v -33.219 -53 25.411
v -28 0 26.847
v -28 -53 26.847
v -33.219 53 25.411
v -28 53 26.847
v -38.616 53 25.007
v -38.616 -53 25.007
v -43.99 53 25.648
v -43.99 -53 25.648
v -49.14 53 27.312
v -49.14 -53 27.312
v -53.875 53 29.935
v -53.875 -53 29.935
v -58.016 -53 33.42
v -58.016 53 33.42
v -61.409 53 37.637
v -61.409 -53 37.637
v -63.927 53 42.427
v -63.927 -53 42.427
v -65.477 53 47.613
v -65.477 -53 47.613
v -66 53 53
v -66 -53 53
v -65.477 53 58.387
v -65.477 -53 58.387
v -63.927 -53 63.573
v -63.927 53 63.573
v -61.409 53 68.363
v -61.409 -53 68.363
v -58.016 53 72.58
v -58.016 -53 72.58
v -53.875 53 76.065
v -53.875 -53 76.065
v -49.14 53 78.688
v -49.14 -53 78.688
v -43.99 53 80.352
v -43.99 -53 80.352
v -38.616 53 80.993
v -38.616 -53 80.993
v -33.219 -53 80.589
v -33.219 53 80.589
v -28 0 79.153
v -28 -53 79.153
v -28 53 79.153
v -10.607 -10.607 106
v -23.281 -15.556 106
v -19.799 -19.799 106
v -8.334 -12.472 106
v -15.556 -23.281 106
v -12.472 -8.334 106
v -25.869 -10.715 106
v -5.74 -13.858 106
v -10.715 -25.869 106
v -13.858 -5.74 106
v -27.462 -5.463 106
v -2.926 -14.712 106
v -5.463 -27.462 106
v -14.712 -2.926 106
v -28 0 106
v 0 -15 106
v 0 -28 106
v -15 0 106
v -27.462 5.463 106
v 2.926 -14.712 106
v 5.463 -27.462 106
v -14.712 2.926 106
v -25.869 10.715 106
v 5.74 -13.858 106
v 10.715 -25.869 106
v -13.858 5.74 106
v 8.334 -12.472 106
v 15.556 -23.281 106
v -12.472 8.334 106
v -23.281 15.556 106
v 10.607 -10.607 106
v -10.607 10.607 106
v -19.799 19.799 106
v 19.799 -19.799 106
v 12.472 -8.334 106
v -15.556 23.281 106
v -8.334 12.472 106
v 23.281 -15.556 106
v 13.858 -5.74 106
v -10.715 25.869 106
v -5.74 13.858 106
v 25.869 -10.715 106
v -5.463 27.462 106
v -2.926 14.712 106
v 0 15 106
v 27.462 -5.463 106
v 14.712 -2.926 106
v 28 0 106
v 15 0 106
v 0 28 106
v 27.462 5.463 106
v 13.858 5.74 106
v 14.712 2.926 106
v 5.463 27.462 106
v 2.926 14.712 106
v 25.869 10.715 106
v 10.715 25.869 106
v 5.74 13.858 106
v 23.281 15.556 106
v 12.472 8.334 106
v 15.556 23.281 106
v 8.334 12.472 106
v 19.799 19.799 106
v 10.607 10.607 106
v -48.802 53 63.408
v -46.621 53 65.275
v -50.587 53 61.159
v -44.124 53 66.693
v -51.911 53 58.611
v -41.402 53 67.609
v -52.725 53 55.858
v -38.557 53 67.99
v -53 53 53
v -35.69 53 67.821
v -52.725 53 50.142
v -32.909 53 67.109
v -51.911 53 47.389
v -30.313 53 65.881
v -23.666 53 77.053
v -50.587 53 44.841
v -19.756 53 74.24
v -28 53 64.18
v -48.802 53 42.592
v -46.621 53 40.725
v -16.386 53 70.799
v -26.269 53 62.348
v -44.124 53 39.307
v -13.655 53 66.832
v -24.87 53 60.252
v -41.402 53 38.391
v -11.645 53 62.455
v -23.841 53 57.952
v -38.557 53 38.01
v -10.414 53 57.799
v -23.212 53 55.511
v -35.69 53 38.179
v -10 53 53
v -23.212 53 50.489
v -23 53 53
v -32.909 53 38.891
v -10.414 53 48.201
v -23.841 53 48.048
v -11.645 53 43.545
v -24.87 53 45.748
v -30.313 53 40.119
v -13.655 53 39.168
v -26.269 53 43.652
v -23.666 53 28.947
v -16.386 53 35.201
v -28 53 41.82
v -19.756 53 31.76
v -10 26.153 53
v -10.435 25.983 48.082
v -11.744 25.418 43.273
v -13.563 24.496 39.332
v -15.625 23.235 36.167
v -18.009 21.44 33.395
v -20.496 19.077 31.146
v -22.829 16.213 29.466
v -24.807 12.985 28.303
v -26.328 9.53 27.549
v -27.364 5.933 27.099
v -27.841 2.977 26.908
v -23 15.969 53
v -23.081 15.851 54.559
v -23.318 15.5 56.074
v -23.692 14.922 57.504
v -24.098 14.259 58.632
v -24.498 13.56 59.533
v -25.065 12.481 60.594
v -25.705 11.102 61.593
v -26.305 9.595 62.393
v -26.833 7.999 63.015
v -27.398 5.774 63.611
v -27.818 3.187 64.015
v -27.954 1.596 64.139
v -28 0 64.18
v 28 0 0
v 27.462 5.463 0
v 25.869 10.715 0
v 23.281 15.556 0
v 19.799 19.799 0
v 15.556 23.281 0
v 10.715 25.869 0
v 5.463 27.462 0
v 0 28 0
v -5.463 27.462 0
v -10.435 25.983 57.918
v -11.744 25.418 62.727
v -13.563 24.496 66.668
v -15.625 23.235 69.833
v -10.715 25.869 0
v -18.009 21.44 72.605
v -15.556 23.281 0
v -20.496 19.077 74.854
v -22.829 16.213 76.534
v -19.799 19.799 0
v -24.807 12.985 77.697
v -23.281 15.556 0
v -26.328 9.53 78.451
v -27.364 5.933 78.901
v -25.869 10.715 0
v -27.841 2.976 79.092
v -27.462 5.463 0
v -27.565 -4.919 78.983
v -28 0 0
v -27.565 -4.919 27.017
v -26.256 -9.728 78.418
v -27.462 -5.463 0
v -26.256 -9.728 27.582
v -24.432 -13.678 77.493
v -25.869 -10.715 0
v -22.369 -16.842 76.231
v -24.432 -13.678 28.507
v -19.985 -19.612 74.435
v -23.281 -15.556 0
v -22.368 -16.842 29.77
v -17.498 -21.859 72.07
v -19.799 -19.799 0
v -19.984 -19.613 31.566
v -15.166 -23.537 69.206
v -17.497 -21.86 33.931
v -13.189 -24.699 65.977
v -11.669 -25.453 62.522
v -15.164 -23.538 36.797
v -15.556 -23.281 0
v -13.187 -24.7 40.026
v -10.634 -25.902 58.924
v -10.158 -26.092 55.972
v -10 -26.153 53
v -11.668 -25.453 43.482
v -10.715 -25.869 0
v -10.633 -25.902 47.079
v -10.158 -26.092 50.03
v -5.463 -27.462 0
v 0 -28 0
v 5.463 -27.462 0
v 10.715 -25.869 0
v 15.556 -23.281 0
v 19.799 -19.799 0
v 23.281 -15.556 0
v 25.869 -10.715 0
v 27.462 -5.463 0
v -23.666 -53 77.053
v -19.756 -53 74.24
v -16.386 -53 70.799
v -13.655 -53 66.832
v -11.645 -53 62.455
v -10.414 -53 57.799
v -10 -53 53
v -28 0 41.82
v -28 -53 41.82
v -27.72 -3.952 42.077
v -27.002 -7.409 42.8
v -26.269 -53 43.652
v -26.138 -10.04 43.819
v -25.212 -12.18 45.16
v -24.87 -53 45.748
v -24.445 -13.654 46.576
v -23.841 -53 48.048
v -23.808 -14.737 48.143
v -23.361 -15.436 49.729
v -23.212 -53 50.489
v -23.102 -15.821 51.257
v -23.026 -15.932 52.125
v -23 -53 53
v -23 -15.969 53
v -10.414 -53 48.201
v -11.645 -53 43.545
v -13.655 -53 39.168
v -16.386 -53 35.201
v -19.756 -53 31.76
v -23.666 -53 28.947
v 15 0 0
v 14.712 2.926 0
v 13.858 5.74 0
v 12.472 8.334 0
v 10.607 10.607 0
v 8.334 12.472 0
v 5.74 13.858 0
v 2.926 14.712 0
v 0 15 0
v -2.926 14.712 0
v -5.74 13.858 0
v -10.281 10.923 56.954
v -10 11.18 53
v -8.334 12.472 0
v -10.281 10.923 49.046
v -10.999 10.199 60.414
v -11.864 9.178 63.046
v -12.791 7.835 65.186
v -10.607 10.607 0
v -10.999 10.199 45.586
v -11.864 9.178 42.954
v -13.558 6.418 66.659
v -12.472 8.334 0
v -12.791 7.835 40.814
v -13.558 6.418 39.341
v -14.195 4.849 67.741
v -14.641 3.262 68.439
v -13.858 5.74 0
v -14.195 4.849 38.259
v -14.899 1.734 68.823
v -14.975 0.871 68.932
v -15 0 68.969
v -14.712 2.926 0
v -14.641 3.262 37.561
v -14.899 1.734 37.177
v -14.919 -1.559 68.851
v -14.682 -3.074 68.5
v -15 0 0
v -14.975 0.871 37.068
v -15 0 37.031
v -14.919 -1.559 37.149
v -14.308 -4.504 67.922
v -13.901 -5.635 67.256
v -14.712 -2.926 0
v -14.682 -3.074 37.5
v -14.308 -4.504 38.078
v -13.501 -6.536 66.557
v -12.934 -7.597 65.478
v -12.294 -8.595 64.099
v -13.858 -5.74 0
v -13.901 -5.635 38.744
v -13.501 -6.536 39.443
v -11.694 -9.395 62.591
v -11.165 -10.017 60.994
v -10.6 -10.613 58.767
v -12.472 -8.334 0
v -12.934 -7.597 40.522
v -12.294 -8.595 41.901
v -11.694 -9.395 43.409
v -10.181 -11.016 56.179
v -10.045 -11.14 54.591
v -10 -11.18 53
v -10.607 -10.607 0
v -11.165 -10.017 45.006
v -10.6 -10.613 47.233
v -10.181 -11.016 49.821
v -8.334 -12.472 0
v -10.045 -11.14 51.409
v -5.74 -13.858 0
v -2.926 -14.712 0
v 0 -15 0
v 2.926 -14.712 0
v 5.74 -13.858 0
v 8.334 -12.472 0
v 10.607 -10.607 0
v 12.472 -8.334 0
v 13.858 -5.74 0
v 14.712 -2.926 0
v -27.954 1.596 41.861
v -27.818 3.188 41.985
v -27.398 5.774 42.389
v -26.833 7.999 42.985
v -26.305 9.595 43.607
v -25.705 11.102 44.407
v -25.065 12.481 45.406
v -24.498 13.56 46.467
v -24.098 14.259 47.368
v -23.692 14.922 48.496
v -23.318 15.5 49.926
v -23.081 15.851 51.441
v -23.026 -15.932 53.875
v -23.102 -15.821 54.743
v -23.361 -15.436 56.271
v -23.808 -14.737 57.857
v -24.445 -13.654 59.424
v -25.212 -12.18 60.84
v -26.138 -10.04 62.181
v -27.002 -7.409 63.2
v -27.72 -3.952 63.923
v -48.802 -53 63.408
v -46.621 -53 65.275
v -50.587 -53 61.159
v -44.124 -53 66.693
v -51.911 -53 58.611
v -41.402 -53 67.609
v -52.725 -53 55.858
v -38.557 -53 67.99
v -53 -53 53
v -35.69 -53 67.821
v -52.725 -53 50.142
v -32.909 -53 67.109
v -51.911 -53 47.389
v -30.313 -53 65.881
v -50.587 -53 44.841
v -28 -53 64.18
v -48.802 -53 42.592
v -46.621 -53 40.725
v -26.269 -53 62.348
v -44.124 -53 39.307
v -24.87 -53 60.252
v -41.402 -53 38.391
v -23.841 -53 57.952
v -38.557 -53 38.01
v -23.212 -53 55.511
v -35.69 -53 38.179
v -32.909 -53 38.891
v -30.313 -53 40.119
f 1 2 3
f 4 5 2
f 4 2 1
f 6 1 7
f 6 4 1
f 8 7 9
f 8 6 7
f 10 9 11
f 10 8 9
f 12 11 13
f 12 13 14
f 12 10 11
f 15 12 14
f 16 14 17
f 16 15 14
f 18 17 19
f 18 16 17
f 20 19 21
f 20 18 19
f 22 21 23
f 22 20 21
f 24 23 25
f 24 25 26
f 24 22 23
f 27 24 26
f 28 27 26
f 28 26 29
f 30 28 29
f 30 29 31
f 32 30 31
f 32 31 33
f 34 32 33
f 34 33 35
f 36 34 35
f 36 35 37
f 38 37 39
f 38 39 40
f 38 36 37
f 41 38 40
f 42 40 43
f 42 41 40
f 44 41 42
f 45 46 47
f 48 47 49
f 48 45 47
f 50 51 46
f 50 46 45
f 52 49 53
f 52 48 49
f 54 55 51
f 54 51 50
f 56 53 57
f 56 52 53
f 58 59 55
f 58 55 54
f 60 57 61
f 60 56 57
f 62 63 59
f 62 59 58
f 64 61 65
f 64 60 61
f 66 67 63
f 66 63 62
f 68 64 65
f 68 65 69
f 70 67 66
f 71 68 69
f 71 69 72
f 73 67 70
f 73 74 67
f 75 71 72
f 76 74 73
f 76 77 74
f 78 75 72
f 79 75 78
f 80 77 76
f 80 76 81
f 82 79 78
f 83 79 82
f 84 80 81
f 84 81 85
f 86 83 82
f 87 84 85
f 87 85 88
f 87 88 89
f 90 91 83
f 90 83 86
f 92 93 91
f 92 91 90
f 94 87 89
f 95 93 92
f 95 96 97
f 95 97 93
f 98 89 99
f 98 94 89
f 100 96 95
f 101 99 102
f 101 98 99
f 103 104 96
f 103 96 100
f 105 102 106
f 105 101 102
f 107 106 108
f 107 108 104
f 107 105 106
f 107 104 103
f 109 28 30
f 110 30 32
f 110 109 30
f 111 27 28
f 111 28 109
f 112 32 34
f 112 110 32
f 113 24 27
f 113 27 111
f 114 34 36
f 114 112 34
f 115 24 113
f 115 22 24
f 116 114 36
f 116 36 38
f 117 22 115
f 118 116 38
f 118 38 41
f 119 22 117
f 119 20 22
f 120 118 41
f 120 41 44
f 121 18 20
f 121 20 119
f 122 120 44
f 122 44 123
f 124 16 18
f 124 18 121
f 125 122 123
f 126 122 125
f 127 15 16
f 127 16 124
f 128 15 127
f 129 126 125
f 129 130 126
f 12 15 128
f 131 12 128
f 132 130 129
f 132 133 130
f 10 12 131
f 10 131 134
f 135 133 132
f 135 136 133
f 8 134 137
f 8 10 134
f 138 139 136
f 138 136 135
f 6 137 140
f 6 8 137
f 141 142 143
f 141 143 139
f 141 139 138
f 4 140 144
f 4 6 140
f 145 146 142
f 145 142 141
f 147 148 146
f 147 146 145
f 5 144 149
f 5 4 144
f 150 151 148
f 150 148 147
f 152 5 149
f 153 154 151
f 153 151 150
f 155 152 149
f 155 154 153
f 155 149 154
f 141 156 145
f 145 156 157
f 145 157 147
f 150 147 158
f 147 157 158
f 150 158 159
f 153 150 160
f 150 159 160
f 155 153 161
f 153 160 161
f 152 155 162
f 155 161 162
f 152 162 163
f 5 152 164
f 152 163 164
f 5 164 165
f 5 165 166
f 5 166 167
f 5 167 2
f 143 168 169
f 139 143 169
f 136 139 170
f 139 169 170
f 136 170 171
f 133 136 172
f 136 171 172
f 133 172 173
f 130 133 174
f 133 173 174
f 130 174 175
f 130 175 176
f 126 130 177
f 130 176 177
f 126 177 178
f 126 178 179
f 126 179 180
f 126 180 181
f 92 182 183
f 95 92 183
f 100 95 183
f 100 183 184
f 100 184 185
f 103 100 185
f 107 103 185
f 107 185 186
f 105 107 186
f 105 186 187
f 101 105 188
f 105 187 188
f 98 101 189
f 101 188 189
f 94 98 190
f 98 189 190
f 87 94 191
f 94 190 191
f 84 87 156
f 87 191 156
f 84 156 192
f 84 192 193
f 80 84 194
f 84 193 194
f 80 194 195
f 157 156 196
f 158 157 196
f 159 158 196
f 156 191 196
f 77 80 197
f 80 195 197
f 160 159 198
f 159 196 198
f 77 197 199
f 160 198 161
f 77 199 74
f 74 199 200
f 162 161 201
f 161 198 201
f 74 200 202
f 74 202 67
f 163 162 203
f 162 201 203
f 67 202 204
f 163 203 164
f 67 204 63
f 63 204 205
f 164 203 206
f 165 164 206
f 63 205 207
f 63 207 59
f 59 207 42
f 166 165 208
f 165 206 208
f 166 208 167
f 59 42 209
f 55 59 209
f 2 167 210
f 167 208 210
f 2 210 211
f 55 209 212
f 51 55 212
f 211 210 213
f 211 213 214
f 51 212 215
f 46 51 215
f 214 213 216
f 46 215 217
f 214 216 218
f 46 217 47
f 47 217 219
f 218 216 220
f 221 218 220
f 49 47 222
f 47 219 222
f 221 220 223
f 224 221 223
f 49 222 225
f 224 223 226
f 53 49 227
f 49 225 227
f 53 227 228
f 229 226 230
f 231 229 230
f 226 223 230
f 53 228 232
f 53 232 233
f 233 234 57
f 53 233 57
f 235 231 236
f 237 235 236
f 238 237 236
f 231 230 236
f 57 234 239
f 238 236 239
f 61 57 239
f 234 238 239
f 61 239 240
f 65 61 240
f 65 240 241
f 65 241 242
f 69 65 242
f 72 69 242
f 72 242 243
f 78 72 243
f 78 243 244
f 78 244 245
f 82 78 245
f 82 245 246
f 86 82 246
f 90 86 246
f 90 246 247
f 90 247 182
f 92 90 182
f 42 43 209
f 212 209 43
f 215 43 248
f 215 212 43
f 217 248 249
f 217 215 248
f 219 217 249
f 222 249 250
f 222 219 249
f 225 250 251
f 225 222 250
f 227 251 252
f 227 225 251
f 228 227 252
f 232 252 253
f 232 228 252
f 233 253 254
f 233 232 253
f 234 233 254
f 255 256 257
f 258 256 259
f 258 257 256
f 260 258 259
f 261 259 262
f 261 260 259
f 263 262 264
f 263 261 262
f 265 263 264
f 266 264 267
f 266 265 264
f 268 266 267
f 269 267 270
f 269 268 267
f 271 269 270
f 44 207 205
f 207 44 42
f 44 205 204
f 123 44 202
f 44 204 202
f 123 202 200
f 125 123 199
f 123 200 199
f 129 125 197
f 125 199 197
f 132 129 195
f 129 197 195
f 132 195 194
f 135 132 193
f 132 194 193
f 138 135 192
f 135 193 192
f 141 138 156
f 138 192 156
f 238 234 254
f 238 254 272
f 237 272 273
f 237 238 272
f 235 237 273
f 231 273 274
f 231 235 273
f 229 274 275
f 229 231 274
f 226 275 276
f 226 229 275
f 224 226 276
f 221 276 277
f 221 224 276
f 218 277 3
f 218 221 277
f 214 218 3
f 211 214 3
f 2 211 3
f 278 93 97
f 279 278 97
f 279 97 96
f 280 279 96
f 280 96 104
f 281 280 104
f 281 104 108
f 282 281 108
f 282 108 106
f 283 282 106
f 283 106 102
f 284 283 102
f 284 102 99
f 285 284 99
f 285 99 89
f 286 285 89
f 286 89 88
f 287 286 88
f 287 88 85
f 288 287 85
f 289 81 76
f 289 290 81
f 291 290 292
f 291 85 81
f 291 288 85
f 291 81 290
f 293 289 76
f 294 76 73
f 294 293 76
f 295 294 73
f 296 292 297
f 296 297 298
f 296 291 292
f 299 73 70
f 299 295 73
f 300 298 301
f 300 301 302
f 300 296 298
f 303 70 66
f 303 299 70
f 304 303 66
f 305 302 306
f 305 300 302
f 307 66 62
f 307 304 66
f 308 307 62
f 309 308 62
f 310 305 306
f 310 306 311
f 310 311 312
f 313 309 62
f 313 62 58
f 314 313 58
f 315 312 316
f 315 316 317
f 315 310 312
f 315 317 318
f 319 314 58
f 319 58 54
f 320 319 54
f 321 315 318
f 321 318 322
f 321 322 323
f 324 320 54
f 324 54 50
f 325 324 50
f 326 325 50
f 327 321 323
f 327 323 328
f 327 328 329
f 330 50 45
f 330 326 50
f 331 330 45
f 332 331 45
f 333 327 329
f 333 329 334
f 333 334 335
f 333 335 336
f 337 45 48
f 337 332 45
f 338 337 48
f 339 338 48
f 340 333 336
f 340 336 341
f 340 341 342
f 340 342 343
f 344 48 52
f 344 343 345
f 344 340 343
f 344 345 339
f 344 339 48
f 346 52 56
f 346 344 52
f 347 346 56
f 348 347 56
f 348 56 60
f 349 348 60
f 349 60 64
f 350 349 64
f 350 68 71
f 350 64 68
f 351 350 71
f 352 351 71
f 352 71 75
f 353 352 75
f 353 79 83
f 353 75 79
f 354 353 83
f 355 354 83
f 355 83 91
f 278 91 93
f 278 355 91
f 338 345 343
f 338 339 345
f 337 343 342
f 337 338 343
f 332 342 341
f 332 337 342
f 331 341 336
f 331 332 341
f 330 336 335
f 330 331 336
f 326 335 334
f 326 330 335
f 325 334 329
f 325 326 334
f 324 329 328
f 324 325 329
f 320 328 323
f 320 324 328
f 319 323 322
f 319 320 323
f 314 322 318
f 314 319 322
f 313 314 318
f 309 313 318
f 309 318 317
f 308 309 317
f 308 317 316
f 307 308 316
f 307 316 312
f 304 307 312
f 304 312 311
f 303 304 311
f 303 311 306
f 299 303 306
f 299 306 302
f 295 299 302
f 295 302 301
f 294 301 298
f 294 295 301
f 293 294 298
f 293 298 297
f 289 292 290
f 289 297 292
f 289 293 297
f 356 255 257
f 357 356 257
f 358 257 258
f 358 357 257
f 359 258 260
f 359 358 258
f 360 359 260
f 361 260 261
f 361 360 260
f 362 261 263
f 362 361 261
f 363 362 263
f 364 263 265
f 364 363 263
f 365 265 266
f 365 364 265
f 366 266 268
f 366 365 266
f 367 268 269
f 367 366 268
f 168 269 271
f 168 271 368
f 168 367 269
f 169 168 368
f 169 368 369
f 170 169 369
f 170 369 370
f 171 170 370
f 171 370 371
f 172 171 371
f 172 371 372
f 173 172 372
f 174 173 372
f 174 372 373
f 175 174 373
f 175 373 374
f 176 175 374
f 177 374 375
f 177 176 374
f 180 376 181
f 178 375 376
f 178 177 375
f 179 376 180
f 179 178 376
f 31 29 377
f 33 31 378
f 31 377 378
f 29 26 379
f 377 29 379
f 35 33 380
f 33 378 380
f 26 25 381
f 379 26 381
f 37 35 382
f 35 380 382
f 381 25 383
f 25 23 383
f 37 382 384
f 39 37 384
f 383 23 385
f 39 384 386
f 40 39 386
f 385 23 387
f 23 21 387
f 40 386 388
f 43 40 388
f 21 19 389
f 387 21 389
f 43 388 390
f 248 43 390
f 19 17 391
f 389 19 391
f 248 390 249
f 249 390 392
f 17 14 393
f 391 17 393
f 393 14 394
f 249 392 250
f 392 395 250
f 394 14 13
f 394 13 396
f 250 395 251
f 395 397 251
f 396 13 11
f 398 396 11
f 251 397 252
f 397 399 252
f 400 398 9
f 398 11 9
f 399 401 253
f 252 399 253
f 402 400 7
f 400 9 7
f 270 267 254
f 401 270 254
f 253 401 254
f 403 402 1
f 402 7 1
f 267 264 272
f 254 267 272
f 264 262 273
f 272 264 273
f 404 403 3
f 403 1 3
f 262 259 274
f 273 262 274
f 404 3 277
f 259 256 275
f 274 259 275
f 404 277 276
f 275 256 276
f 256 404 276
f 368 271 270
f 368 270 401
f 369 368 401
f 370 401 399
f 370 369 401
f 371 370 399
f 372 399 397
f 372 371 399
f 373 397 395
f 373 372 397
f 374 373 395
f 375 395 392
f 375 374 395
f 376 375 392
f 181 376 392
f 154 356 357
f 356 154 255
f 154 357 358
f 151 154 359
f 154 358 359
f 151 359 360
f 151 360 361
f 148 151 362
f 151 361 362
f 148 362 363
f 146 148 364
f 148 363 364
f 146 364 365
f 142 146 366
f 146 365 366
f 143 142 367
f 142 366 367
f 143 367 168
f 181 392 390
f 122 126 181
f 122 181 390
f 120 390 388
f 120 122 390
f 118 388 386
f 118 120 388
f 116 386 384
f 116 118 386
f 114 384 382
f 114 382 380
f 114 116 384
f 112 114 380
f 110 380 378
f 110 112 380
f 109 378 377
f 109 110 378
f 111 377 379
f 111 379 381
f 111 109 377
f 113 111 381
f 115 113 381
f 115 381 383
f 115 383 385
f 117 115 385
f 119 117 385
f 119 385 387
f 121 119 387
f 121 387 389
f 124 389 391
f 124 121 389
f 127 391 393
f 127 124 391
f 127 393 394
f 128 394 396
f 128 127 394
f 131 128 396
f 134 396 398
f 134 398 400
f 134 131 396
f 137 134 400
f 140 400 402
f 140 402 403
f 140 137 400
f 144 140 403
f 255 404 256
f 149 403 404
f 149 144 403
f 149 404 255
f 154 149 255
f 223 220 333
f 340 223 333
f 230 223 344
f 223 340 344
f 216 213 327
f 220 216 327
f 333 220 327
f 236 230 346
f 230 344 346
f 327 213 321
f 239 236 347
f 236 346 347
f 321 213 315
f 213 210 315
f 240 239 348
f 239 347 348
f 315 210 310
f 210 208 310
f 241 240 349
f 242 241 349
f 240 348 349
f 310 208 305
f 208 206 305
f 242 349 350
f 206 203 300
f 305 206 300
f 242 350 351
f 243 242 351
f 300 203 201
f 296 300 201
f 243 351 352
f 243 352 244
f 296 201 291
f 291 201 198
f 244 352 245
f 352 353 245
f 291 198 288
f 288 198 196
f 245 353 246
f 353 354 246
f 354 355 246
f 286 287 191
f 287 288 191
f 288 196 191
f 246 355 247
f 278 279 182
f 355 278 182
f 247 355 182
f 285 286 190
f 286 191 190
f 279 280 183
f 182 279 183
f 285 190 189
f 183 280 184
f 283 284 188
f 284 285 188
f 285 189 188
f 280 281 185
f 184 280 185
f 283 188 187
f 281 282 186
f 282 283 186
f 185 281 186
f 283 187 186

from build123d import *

# Parameters (mm, degrees)
SKETCH1_R           = 28
SKETCH1_R_2         = 15
BOSS_EXTRUDE1_DEPTH = 106
BOSS_EXTRUDE3_DEPTH = 53
CUT_EXTRUDE1_DEPTH  = 128
CUT_EXTRUDE2_DEPTH  = 123


with BuildPart() as part:
    # Sketch1 → Boss-Extrude1 (new body)
    with BuildSketch(Plane.XY):
        Circle(SKETCH1_R)
        Circle(SKETCH1_R_2, mode=Mode.SUBTRACT)
    extrude(amount=BOSS_EXTRUDE1_DEPTH)

    # Sketch2 → Boss-Extrude3 (add, symmetric)
    with BuildSketch(Plane(origin=(0, 0, 0), x_dir=(1, 0, 0), z_dir=(0, 1, 0))):
        with BuildLine():
            ThreePointArc((-28, -26.846606339), (-66, -53), (-28, -79.153393661))
            Line((-28, -79.153393661), (-28, -64.180339887))
            ThreePointArc((-28, -64.180339887), (-53, -53), (-28, -41.819660113))
            Line((-28, -41.819660113), (-28, -26.846606339))
        make_face()
        with BuildLine():
            Line((-28, -64.180339887), (-28, -79.153393661))
            ThreePointArc((-28, -79.153393661), (-14.934874811, -68.874507866), (-10, -53))
            ThreePointArc((-10, -53), (-14.934874811, -37.125492134), (-28, -26.846606339))
            Line((-28, -26.846606339), (-28, -41.819660113))
            ThreePointArc((-28, -41.819660113), (-24.306936062, -46.876275643), (-23, -53))
            ThreePointArc((-23, -53), (-24.306936062, -59.123724357), (-28, -64.180339887))
        make_face()
    extrude(amount=BOSS_EXTRUDE3_DEPTH, both=True)

    # Sketch3 → Cut-Extrude1 (cut, symmetric)
    with BuildSketch(Plane.XY):
        with BuildLine():
            Line((-10, 11.180339887), (-10, -11.180339887))
            ThreePointArc((-10, -11.180339887), (-15, 0), (-10, 11.180339887))
        make_face()
    extrude(amount=CUT_EXTRUDE1_DEPTH, both=True, mode=Mode.SUBTRACT)

    # Sketch4 → Cut-Extrude2 (cut, symmetric)
    with BuildSketch(Plane(origin=(0, 0, 0), x_dir=(1, 0, 0), z_dir=(0, 1, 0))):
        with BuildLine():
            Line((-28, -64.180339887), (-28, -41.819660113))
            ThreePointArc((-28, -41.819660113), (-23, -53), (-28, -64.180339887))
        make_face()
    extrude(amount=CUT_EXTRUDE2_DEPTH, both=True, mode=Mode.SUBTRACT)


solid = part.part
